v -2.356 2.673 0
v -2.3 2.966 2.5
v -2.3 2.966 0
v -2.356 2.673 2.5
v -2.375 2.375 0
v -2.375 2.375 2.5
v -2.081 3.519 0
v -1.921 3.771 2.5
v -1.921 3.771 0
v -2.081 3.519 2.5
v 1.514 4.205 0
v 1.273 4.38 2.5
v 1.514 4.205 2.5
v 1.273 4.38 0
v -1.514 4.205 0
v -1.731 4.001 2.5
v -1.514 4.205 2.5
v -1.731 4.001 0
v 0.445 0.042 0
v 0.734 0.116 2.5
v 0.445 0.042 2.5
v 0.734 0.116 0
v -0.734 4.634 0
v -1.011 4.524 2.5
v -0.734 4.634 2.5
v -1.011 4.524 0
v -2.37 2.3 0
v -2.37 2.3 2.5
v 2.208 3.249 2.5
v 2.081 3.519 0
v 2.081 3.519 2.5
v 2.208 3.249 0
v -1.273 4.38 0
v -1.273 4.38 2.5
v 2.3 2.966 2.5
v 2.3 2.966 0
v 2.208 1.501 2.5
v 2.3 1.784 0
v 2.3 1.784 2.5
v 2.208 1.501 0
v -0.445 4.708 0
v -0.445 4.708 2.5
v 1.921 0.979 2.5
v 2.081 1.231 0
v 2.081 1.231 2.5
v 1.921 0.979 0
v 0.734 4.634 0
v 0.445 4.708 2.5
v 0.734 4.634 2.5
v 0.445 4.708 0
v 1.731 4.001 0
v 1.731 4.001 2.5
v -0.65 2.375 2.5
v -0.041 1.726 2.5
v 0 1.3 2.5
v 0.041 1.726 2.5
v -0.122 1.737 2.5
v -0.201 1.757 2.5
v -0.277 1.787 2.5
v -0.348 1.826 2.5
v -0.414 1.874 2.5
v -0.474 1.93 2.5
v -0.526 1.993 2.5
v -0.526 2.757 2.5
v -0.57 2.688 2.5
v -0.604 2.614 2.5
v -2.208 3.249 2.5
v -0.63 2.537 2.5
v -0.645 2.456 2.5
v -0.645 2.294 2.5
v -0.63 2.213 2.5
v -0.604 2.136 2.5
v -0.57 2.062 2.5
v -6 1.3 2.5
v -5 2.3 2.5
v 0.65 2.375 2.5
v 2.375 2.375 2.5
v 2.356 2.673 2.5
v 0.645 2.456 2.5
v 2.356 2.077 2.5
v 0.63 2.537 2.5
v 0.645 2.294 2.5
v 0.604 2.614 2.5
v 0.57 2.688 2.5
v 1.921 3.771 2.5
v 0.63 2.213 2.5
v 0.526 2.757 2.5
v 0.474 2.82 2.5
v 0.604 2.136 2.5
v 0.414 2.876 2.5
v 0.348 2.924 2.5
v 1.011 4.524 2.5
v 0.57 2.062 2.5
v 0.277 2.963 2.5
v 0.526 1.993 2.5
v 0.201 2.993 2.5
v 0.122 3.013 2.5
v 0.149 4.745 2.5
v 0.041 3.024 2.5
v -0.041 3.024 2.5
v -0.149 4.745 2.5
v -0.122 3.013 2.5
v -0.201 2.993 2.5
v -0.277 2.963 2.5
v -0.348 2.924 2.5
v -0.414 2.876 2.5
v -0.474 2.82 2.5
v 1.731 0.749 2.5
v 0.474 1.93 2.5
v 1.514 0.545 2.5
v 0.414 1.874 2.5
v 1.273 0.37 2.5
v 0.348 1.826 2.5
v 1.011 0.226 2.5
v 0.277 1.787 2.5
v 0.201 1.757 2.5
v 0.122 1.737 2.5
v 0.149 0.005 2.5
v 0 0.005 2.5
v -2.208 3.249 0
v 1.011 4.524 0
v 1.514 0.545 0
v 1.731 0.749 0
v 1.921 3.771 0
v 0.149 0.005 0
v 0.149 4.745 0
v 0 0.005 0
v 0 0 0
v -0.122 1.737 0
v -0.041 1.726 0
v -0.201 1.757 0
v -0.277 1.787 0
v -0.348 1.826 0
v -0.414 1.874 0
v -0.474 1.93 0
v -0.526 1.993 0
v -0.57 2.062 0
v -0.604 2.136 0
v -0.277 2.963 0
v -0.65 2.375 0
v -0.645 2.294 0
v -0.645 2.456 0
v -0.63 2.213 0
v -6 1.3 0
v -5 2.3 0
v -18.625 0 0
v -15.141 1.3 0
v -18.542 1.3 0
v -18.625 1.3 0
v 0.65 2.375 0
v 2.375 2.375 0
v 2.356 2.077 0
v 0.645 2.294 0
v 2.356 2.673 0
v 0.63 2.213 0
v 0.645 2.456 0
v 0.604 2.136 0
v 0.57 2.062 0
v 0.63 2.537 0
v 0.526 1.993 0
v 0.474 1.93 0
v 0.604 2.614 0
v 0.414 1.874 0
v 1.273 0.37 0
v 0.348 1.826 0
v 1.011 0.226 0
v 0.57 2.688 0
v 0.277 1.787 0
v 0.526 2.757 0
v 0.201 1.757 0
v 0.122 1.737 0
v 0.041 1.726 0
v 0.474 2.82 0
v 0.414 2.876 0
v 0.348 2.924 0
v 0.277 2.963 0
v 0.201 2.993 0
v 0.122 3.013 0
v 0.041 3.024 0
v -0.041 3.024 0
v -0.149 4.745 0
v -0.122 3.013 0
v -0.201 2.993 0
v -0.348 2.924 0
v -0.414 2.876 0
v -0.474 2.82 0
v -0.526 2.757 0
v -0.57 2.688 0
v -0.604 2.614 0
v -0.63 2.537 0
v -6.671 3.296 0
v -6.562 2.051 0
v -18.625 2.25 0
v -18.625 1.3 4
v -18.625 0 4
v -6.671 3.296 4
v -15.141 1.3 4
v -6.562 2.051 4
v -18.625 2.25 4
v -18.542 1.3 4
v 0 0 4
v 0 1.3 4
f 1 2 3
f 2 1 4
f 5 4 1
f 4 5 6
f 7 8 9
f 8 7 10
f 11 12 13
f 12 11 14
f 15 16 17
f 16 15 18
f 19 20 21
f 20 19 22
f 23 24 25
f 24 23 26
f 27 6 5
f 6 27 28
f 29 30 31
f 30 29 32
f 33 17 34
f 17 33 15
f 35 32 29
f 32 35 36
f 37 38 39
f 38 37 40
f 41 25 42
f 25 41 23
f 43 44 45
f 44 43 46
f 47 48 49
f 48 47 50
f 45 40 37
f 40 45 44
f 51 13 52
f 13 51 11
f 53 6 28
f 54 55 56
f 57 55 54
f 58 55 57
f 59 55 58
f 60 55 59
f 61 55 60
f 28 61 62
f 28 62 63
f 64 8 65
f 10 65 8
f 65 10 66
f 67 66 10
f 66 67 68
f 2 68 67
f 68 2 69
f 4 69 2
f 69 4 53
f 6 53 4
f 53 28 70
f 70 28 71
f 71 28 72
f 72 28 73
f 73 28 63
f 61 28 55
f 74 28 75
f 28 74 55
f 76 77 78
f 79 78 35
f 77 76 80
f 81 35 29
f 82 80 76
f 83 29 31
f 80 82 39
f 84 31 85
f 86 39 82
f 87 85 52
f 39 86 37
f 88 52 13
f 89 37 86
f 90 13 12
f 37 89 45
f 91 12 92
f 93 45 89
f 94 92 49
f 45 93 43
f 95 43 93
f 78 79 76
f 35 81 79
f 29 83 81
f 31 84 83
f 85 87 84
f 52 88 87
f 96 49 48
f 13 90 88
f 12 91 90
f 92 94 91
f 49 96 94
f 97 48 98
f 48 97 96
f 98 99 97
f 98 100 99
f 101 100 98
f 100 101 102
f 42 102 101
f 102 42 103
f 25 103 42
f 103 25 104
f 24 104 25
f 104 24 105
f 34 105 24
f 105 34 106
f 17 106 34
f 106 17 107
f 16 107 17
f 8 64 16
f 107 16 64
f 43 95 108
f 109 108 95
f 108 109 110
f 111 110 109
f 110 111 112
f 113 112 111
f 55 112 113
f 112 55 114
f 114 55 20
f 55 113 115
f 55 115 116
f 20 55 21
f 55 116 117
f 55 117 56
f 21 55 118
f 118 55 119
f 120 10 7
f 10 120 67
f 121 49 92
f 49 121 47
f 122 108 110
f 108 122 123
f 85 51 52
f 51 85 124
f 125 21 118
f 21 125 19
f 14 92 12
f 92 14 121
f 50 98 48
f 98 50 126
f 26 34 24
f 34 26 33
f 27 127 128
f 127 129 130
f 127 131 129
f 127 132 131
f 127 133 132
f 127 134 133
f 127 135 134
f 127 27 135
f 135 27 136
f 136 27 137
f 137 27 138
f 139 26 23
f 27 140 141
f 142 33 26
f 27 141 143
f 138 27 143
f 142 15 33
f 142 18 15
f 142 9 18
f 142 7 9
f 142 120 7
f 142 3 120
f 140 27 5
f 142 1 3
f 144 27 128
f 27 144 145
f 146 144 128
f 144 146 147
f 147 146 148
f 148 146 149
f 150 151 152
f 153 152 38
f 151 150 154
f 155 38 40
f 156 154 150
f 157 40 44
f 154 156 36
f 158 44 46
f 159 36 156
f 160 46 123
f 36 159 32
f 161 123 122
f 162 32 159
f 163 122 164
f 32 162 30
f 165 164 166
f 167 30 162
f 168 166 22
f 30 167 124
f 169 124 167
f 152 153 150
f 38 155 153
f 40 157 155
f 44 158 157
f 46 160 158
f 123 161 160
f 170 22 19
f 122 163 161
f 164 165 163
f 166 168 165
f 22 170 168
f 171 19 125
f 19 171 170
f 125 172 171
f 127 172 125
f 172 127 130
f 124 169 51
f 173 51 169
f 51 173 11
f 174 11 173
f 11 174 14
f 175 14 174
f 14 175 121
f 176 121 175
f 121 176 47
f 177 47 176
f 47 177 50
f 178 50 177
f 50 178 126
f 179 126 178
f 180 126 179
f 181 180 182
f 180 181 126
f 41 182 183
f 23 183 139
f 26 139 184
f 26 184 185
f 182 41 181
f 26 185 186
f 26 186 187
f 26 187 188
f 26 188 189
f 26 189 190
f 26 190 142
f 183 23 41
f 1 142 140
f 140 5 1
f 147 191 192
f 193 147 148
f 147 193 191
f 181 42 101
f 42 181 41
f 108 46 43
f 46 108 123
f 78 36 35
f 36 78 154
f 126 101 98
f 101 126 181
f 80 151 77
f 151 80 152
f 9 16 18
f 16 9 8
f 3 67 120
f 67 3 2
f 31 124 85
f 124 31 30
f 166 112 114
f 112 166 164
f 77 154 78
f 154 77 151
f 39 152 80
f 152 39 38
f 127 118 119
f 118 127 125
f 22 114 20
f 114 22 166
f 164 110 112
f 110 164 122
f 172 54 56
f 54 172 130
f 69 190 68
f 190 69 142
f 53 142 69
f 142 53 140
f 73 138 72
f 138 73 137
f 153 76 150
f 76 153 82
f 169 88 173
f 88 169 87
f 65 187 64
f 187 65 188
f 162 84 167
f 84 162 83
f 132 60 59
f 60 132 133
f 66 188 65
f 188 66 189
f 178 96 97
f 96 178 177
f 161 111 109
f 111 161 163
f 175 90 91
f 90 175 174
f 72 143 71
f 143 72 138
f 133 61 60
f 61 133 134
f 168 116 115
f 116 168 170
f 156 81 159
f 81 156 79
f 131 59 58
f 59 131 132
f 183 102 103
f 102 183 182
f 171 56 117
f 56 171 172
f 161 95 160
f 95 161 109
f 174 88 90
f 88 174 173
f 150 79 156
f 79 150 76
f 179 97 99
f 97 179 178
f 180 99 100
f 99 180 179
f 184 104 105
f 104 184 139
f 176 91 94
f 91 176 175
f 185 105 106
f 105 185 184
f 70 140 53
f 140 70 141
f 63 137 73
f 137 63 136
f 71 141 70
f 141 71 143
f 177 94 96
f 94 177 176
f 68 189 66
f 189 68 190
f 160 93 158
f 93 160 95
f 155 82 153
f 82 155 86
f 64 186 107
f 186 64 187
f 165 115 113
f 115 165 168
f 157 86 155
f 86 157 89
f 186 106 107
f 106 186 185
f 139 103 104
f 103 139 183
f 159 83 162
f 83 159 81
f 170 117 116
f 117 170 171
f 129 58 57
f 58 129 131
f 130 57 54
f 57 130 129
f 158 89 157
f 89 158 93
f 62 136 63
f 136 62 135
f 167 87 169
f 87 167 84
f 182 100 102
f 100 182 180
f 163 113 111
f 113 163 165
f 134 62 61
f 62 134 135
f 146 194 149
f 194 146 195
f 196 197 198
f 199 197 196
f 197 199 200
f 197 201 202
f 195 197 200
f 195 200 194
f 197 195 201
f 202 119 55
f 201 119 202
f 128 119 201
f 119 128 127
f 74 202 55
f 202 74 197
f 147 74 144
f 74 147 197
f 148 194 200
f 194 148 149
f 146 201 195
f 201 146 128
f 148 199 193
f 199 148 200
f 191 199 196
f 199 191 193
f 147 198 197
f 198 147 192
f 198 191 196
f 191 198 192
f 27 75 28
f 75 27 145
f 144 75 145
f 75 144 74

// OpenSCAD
// file: ../gospel.scad
/**
 * GOSPEL: George's OpenSCAD Procedural Enhancement Library
 * @author glaza
 *
 * Index:
 *      Translation: x, y, z, xy, xz, yz, xyz (displacement, variation)
 *      Scaling:     sx, sy, sz, sxy, sxz, syz, s (factor, variation)
 *      Rotation:    rx, ry, rz (angle, variation)
 *      Duplication: dx, dy, dz ()
 */

/**
 * Translates the children in the X,Y,Z direction
 * @param d Displacement in X,Y,Z direction
 * @param variation The random variation + or - added to the displacement * 
 *  x      Translate X
 *  y      Translate Y
 *  z      Translate Z
 *  xy     Translate equaly in X and Y
 *  xz     Translate equaly in X and Z
 *  yz     Translate equaly in Y and Z
 *  xyz    Translate equaly in X, Y and Z
 */
module x(dx, variation=0) 
{   
    vx = rands(-variation,variation,1)[0];
    translate([dx+vx,0,0])
    children();
}
module y(dy, variation=0) 
{   
    vy = rands(-variation,variation,1)[0];
    translate([0,dy+vy,0])
    children();
} 
module z(dz, variation=0) 
{   
    vz = rands(-variation,variation,1)[0];
    translate([0,0,dz+vz])
    children();
}
module xy(d, variation=0) 
{   
    x(d, variation)
    y(d, variation)
    children();
}
module yz(d, variation=0) 
{   
    z(d, variation)
    y(d, variation)
    children();
}
module xz(d, variation=0) 
{   
    x(d, variation)
    z(d, variation)
    children();
}
module xyz(d, variation=0) 
{   
    xy(d, variation)
    z(d, variation)
    children();
}

/**
 * Rotates the children around the X axis
 * @param angle Degrees to rotate around the X axis
 * @param variation The random variation + or - added
 *  rx     Rotate around X
 *  ry     Rotate around Y
 *  rz     Rotate around Z
 */
module rx(angle, variation=0) 
{   
    v = rands(-variation,variation,1)[0];
    rotate([angle+v,0,0])
    children();
}
module ry(angle, variation=0) 
{   
    v = rands(-variation,variation,1)[0];
    rotate([0,angle+v,0,0])
    children();
}
module rz(angle, variation=0) 
{   
    v = rands(-variation,variation,1)[0];
    rotate([0,0,angle+v])
    children();
}

/**
 * Duplicates the children across the different planes.
 *      dx: YZ plane, dy: XZ plane, dz: XY plane
 */
module dx() 
{
    mirror([1,0,0])
    children();

    children();
}
module dy() 
{
    mirror([0,1,0])
    children();

    children();
}
module dz() 
{
    mirror([0,0,1])
    children();

    children();
}

/**
 * Mirrors across diferent planes.
 *      mx: YZ plane, my: XZ plane, mz: XY plane
 */
module mx() 
{
    mirror([1,0,0])
    children();
}
module my() 
{
    mirror([0,1,0])
    children();
}
module mz() 
{
    mirror([0,0,1])
    children();
}

/**
 * Scales in different directions
 *      mx: YZ plane, my: XZ plane, mz: XY plane
 */
module sx(factor, variation=0) 
{   
    v = rands(-variation,variation,1)[0];
    scale([factor+v,1,1])
    children();
}
module sy(factor, variation=0) 
{   
    v = rands(-variation,variation,1)[0];
    scale([1,factor+v,1])
    children();
} 
module sz(factor, variation=0) 
{   
    v = rands(-variation,variation,1)[0];
    scale([1,1,factor+v])
    children();
}
module sxy(factor, variation=0) 
{   
    sx(factor, variation)
    sy(factor, variation)
    children();
}
module syz(factor, variation=0) 
{   
    sz(factor, variation)
    sy(factor, variation)
    children();
}
module sxz(d, variation=0) 
{   
    sx(factor, variation)
    sz(factor, variation)
    children();
}
module s(factor, variation=0) 
{   
    sxy(factor, variation)
    sz(factor, variation)
    children();
}

/**
 * Colours
 */
module red()
{
    color("Red")
    children();
}
module blue()
{
    color("RoyalBlue")
    children();
}
module black()
{
    color("Black")
    children();
}
module white()
{
    color("White")
    children();
}
// main file
include <../gospel.scad>

$fn = 50;

mirror()
{
    y( 2.375 )
    difference()
    {
        cylinder( h = 2.5, d = 4.75 );
        cylinder( h = 2.5, d = 1.3 );
    }

    cube( [ 21 - 2.375, 1.3, 4 ] );

    x( 21 - 2.375 )
    y( 2.25 )
    rz( 175 )
    cube( [ 12, 1.25, 4 ] );

    x( 2 )
    cube( [ 3, 2.3, 2.5 ] );

    x( 6.0606 )
    y( 1.239 )
    rz( 135 )
    cube( [ 1.5, 1, 2.5 ] );
}
